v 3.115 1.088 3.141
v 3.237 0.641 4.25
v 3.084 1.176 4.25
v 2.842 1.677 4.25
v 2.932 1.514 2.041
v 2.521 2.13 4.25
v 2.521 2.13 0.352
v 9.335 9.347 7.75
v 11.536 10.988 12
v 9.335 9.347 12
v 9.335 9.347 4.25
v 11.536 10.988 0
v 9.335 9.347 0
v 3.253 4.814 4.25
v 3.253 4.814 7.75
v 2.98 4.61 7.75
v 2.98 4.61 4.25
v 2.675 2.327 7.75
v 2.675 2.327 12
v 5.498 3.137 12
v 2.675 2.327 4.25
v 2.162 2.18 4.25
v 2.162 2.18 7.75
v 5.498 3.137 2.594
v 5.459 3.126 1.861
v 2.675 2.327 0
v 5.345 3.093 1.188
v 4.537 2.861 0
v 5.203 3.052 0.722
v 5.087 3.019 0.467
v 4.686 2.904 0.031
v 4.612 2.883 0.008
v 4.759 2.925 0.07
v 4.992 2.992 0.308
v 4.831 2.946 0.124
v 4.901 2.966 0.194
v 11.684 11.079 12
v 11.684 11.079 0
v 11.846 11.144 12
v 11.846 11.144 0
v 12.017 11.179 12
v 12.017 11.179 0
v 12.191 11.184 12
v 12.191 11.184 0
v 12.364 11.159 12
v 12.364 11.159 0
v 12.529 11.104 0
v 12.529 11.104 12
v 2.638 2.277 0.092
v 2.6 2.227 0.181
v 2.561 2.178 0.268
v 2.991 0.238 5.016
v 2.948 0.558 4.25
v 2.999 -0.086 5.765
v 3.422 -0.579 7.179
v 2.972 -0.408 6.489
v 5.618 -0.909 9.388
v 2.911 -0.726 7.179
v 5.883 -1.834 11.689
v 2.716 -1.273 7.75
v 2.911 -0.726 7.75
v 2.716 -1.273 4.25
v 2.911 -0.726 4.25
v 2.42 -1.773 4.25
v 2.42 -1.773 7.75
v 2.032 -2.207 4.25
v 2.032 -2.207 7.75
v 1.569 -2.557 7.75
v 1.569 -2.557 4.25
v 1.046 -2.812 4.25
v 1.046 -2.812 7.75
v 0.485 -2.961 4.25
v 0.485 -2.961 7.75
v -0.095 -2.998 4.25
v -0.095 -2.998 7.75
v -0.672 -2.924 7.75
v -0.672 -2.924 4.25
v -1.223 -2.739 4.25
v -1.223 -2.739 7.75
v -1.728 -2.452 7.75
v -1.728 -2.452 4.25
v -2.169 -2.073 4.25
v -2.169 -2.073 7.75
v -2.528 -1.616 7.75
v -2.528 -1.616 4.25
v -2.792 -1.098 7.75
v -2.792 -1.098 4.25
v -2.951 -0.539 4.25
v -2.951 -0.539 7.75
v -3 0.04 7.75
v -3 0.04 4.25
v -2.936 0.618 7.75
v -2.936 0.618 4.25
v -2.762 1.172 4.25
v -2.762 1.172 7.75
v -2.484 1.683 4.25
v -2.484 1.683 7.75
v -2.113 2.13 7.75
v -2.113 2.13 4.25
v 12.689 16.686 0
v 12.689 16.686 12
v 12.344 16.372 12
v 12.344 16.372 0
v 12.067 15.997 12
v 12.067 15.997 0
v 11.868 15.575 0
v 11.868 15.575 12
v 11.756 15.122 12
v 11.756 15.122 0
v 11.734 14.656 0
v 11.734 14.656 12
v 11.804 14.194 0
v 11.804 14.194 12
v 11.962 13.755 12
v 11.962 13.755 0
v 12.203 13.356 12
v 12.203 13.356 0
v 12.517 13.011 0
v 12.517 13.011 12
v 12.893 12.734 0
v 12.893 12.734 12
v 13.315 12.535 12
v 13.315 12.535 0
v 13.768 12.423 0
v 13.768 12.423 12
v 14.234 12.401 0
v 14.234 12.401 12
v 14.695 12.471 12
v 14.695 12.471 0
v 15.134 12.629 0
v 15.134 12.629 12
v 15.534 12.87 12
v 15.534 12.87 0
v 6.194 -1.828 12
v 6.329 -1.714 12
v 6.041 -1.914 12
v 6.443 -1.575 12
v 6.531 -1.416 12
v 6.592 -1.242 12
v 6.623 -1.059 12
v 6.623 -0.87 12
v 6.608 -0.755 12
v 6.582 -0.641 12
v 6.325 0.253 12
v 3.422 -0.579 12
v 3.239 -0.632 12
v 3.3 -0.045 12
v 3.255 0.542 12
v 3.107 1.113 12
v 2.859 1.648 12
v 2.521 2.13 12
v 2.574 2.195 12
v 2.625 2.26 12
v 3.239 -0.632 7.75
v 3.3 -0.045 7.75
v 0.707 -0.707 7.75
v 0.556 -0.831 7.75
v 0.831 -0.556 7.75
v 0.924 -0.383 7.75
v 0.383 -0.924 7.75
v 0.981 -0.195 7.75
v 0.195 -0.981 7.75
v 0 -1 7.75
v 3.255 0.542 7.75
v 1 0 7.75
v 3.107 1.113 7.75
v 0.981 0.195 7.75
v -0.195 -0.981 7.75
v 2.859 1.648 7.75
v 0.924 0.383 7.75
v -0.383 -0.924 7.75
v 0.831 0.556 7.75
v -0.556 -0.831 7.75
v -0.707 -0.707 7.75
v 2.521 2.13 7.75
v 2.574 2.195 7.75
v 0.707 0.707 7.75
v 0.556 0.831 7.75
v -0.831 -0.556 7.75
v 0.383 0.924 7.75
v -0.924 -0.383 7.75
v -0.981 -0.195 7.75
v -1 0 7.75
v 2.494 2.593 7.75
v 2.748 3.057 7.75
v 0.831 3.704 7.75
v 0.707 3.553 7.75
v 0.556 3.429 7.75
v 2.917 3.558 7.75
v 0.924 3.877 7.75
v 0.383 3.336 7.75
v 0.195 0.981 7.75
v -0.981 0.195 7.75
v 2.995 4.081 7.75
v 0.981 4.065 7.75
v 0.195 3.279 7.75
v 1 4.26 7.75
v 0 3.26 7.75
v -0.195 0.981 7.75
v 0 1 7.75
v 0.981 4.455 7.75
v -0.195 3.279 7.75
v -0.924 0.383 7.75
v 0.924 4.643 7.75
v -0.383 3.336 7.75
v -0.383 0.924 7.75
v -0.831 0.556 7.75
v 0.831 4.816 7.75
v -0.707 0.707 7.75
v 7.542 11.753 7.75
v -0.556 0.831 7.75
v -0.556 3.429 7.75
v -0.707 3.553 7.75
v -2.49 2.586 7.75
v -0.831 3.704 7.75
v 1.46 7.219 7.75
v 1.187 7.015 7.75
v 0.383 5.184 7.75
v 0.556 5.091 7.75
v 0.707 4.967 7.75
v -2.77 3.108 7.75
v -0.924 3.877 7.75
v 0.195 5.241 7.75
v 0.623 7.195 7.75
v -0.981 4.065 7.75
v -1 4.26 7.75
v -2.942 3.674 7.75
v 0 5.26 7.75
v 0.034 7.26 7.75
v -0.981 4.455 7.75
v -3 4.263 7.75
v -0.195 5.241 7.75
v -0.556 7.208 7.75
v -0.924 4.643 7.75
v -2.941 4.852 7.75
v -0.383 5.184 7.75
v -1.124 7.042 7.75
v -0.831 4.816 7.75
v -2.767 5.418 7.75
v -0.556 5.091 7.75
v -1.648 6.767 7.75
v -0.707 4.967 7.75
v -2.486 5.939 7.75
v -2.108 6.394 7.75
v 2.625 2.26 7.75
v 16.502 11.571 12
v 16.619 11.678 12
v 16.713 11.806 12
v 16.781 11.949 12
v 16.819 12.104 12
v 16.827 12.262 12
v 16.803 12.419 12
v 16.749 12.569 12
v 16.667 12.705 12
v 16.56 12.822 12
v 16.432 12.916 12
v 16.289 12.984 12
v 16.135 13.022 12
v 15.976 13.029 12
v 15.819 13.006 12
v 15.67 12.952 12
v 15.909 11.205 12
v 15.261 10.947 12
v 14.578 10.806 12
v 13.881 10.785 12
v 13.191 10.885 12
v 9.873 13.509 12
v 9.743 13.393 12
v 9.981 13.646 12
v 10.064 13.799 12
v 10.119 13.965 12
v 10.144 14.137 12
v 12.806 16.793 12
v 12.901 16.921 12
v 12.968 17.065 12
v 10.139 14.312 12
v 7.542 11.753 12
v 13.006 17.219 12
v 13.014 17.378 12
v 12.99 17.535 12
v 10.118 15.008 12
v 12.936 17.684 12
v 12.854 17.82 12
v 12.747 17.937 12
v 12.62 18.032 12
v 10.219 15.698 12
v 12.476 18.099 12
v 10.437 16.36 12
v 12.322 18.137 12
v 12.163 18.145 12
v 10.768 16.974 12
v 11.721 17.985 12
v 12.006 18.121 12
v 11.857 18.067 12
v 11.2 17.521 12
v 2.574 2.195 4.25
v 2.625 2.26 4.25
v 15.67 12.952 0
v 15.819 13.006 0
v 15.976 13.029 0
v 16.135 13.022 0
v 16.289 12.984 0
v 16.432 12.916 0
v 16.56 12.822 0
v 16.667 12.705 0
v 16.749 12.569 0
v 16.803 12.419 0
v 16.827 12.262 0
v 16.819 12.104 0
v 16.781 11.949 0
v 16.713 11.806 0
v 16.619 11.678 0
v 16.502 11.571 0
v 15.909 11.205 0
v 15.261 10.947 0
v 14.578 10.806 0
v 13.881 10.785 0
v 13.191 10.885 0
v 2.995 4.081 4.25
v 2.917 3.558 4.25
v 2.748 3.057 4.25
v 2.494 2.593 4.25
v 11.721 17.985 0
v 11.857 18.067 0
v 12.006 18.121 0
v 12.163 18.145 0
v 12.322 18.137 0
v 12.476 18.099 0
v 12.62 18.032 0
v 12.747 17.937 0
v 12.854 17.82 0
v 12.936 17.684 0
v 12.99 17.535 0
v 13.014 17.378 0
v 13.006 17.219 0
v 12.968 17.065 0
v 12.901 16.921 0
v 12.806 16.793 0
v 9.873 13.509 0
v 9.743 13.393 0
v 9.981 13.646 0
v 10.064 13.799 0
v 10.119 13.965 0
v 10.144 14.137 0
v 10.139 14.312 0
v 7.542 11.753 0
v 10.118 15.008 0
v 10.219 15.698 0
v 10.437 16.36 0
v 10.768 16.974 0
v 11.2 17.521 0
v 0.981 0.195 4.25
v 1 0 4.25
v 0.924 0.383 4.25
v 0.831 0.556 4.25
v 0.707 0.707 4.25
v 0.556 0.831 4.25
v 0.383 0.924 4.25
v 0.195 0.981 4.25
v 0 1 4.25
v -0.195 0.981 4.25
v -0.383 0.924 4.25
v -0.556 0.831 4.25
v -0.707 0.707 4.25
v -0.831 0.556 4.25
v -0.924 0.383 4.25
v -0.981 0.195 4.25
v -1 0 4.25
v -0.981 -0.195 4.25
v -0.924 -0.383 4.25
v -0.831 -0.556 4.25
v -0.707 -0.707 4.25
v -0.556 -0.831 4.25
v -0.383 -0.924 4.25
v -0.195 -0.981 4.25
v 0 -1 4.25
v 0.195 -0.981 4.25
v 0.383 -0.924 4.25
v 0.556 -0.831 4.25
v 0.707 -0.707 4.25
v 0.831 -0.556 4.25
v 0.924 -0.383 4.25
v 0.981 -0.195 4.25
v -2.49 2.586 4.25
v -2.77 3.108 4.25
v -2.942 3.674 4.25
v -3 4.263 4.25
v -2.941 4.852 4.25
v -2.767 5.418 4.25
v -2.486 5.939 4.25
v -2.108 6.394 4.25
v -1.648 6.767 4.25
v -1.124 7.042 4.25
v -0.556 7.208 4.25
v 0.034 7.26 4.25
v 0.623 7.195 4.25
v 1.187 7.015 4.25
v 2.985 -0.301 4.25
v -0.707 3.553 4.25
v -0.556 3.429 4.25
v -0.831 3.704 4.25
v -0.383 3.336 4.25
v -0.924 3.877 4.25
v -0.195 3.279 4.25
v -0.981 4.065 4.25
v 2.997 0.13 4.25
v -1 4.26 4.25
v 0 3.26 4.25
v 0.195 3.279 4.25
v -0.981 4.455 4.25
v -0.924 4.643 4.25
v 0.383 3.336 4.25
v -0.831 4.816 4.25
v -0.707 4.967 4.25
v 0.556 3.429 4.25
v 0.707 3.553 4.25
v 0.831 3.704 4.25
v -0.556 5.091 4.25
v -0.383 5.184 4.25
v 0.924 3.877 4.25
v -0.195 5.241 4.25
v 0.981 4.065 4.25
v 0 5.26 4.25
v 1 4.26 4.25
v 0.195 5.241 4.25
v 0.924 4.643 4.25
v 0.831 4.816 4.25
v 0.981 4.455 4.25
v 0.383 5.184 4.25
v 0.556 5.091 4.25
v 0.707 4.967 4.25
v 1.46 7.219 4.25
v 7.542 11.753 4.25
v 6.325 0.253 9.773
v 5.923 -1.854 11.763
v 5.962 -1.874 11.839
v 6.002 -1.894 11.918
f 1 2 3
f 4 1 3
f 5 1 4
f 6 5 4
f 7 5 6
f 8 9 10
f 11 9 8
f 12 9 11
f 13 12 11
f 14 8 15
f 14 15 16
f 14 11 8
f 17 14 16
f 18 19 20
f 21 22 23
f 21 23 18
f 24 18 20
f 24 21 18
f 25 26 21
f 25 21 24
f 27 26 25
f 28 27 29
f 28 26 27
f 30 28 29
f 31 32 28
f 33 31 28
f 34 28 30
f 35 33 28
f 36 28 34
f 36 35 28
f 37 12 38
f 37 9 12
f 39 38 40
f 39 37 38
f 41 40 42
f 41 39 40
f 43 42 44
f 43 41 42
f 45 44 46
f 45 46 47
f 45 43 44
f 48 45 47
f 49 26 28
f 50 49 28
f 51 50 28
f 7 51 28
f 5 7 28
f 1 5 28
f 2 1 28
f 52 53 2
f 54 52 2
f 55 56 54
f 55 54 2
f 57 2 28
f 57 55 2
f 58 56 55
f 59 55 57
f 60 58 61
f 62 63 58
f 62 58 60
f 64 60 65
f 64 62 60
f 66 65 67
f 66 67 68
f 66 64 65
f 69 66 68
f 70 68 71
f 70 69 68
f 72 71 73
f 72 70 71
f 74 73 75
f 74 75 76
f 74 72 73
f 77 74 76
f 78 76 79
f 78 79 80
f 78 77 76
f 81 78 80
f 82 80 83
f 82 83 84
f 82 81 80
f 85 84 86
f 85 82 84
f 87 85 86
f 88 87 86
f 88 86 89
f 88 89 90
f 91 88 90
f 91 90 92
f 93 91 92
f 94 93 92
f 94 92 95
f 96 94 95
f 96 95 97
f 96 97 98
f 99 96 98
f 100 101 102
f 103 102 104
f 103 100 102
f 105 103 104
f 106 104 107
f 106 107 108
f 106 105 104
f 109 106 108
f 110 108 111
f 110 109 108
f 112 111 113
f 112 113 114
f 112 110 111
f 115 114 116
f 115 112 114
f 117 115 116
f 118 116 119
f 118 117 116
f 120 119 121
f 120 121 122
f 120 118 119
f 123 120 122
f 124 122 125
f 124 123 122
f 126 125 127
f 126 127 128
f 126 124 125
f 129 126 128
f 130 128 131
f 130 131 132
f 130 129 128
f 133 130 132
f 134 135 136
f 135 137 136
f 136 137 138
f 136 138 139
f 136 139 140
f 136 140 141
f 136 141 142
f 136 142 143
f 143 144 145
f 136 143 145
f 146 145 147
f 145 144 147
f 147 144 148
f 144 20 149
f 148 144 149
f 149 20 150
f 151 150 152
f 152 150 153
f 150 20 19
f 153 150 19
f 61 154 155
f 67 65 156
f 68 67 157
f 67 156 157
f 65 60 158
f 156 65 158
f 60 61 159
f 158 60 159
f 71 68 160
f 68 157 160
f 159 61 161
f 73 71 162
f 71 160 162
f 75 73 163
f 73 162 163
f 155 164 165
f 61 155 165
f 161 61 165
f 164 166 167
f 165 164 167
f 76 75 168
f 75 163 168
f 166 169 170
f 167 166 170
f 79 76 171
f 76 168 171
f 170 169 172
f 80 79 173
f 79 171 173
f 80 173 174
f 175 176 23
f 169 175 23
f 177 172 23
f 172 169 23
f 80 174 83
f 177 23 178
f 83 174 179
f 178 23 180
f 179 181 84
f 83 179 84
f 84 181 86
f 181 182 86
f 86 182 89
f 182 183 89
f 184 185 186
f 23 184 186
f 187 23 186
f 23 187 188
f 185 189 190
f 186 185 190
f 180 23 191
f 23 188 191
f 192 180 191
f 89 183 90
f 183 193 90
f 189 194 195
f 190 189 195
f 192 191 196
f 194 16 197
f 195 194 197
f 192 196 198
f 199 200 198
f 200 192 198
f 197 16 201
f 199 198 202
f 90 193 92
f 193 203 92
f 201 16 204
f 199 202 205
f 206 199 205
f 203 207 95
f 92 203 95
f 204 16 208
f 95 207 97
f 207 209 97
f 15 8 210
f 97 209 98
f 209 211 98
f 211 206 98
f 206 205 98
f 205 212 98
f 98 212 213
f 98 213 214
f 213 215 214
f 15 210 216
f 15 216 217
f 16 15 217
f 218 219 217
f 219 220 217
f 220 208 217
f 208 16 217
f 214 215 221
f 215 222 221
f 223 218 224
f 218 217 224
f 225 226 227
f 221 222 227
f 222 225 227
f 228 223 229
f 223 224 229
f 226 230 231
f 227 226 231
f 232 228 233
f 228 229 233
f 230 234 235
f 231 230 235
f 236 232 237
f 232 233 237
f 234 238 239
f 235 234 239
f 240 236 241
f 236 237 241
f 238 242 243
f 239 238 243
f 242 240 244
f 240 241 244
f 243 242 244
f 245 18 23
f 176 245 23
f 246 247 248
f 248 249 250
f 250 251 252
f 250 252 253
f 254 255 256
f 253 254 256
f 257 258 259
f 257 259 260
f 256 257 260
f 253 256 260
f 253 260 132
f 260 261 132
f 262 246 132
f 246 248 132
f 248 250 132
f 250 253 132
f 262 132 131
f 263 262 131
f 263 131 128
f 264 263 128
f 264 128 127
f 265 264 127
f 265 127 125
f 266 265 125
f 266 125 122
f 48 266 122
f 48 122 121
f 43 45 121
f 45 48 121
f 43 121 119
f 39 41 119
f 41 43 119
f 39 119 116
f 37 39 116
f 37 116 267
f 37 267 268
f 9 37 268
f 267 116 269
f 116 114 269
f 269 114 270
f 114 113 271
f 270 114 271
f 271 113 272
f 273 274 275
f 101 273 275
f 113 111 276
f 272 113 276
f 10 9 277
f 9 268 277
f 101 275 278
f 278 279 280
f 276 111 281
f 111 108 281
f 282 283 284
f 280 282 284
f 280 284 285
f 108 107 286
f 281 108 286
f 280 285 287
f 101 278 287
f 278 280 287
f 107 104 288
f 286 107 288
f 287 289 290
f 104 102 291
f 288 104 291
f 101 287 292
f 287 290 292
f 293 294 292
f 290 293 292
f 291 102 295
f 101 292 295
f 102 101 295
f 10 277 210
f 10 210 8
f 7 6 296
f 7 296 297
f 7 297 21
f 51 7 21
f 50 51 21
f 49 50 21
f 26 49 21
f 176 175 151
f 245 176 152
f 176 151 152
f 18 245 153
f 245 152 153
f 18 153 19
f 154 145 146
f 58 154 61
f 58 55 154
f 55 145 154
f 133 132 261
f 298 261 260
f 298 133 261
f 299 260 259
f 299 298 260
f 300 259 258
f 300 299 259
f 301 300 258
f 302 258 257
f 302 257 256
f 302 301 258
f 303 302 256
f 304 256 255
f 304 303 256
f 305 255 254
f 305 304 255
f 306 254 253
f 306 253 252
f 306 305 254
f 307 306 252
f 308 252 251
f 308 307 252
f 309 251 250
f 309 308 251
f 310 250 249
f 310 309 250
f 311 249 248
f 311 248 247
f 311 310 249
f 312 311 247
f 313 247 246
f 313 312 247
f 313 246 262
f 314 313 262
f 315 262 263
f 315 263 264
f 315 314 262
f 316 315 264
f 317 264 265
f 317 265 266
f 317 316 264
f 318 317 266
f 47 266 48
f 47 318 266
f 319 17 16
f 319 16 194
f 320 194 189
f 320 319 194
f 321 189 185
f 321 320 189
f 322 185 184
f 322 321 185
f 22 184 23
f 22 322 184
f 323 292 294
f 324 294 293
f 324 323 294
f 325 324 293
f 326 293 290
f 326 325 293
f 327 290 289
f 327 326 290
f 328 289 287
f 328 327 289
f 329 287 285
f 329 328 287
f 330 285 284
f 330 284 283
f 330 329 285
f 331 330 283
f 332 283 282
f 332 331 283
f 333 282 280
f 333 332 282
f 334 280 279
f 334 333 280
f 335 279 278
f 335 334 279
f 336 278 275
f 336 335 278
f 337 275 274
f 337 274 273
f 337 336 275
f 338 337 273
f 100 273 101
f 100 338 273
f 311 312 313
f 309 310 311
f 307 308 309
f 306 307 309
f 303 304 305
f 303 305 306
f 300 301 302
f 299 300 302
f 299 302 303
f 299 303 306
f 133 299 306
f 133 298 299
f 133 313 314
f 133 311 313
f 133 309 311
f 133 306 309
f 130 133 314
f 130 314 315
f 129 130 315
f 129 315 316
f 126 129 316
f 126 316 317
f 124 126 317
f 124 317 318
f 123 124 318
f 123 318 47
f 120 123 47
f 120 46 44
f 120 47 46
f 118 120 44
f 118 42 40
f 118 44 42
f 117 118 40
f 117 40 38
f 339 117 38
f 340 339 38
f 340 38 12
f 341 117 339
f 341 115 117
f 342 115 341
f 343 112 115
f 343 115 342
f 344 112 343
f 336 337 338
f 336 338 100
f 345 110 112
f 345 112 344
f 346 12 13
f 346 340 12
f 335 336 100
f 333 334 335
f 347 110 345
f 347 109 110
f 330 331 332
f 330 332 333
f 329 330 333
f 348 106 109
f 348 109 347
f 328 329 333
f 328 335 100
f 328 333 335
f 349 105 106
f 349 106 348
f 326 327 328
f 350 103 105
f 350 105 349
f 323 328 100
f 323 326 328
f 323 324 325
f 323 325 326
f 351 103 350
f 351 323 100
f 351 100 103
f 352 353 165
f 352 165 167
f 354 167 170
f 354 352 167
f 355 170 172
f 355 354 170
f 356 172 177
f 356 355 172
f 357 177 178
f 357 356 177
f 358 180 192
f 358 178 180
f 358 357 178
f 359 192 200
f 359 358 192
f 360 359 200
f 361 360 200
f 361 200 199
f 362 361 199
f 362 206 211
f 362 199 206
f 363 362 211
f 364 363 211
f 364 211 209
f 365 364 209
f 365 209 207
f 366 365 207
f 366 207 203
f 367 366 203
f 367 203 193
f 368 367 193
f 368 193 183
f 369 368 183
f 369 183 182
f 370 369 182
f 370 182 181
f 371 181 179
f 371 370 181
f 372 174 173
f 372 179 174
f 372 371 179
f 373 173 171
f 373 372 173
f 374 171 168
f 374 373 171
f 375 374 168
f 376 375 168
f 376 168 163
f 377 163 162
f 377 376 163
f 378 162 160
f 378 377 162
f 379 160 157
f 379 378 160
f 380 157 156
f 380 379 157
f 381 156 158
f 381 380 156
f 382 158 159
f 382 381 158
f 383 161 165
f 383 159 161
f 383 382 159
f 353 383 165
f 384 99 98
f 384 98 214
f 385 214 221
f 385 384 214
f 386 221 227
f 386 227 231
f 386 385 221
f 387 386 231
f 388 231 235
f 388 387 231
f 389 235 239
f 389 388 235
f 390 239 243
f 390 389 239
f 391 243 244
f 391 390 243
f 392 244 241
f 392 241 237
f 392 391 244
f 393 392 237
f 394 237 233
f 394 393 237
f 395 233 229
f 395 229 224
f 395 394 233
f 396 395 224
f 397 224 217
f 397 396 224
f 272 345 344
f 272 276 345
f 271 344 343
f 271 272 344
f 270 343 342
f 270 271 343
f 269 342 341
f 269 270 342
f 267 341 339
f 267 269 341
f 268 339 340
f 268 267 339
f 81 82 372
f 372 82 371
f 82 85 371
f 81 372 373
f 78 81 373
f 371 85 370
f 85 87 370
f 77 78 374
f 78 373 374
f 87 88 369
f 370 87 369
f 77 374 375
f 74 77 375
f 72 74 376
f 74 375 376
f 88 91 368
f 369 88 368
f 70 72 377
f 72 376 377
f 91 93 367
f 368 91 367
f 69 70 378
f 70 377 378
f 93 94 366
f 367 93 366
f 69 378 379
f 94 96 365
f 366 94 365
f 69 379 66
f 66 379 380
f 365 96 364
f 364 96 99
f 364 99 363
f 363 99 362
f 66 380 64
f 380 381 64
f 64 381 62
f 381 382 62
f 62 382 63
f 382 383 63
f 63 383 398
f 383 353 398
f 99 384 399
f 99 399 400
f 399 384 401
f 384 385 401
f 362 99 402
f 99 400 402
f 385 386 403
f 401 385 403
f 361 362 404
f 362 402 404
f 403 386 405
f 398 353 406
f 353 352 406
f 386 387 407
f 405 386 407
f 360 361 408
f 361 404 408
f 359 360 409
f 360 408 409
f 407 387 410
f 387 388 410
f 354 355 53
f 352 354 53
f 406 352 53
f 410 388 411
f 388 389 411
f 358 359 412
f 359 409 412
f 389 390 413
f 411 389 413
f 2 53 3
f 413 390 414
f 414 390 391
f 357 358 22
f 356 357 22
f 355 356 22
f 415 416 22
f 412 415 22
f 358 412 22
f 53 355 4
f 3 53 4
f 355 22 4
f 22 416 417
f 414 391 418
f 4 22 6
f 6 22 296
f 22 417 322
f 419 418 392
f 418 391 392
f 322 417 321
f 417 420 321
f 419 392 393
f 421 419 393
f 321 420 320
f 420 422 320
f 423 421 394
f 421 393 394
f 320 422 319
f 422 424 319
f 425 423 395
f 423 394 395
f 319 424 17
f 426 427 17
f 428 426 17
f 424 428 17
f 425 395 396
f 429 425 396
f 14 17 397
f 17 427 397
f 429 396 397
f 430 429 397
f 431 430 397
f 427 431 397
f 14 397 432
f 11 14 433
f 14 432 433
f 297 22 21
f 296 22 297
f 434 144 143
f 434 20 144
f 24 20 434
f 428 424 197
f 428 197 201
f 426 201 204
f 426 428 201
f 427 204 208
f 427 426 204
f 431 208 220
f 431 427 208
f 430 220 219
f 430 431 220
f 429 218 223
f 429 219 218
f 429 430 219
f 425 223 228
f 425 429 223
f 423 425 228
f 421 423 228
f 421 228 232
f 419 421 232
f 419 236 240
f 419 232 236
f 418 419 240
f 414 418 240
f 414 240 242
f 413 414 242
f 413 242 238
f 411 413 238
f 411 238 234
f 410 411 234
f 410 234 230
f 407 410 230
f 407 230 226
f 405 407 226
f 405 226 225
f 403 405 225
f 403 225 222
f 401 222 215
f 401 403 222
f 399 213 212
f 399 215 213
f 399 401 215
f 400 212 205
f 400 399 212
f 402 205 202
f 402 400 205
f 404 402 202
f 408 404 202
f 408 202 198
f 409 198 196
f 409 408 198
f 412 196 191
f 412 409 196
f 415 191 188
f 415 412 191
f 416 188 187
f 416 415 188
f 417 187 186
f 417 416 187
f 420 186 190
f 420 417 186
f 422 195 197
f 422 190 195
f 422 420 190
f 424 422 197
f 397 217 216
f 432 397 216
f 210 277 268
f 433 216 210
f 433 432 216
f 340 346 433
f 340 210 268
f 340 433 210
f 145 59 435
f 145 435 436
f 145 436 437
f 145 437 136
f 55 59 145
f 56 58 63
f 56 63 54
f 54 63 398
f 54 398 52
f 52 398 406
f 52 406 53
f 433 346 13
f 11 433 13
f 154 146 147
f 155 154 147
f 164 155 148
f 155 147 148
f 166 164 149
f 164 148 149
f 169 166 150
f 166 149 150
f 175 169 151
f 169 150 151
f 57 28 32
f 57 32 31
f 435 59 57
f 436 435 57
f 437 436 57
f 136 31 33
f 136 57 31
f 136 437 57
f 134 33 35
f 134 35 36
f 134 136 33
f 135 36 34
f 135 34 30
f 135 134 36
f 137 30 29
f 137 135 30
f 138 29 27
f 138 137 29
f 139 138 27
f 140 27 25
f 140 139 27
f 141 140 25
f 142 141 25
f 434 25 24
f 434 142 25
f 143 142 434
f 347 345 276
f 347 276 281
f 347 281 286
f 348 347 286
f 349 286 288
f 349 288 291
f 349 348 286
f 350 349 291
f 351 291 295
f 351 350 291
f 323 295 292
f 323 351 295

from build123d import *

# Parameters (mm, degrees)
SKETCH1_R            = 1
BOSS_EXTRUDE1_DEPTH  = 12
CUT_EXTRUDE1_DEPTH   = 4.25
CUT_EXTRUDE3_DEPTH   = 4.25
CUT_EXTRUDE2_START   = -3.551923789
CUT_EXTRUDE2_DEPTH   = 3.551923789
CUT_EXTRUDE2_START_2 = 4.25
CUT_EXTRUDE2_2_DEPTH = 3.5
FILLET8_R            = 1
FILLET9_R            = 1


with BuildPart() as part:
    # Sketch1 → Boss-Extrude1 (new body)
    with BuildSketch(Plane.XY):
        with BuildLine():
            Line((1.186636508, 7.015339144), (10.241749958, 13.764812698))
            ThreePointArc((10.241749958, 13.764812698), (10.336328118, 16.101061111), (11.720750751, 17.985305164))
            ThreePointArc((11.720750751, 17.985305164), (12.854265392, 17.819943261), (12.688903489, 16.68642862))
            ThreePointArc((12.688903489, 16.68642862), (12.203025305, 13.355854737), (15.533599188, 12.869976553))
            ThreePointArc((15.533599188, 12.869976553), (16.667113829, 12.704614651), (16.501751927, 11.57110001))
            ThreePointArc((16.501751927, 11.57110001), (14.300524873, 10.782683155), (12.034625399, 11.359485765))
            Line((12.034625399, 11.359485765), (2.979511949, 4.610012211))
            ThreePointArc((2.979511949, 4.610012211), (2.843457612, 3.303574986), (2.162315925, 2.180483268))
            Line((2.162315925, 2.180483268), (5.498303396, 3.137062282))
            Line((5.498303396, 3.137062282), (6.325215464, 0.253277194))
            Line((6.325215464, 0.253277194), (6.880438917, -1.683017096))
            Line((6.880438917, -1.683017096), (6.052988912, -1.920284566))
            Line((6.052988912, -1.920284566), (3.421928238, -0.579227021))
            Line((3.421928238, -0.579227021), (2.910887179, -0.725765687))
            ThreePointArc((2.910887179, -0.725765687), (-1.48262032, -2.608033164), (-2.112605027, 2.13))
            ThreePointArc((-2.112605027, 2.13), (-2.486159501, 5.938991047), (1.186636508, 7.015339144))
        make_face()
        with Locations((0, 4.26)):
            Circle(SKETCH1_R, mode=Mode.SUBTRACT)
        Circle(SKETCH1_R, mode=Mode.SUBTRACT)
    extrude(amount=BOSS_EXTRUDE1_DEPTH)

    # Sketch2 → Cut-Extrude1 (cut)
    with BuildSketch(Plane.XY.offset(12)):
        with BuildLine():
            ThreePointArc((2.520535657, 2.13), (0, 7.56), (-2.520535657, 2.13))
            ThreePointArc((-2.520535657, 2.13), (0, -3.3), (2.520535657, 2.13))
        make_face()
    cut_extrude1 = extrude(amount=-CUT_EXTRUDE1_DEPTH, mode=Mode.SUBTRACT)

    # Sketch4 → Cut-Extrude3 (cut)
    with BuildSketch(Plane.XY.offset(12)):
        Polygon((7.542328095, 11.752725651), (9.335203536, 9.347398719), (2.498013424, 4.251114272), (0.705137983, 6.656441205), align=None)
    cut_extrude3 = extrude(amount=-CUT_EXTRUDE3_DEPTH, mode=Mode.SUBTRACT)

    # Mirror1: Cut-Extrude1, Cut-Extrude3 across plane
    add(cut_extrude1.mirror(Plane.XY.offset(6)), mode=Mode.SUBTRACT)
    add(cut_extrude3.mirror(Plane.XY.offset(6)), mode=Mode.SUBTRACT)

    # Cut-Extrude2: read off the stored shape, not the designer's step
    # Cut-Extrude2 outline → Cut-Extrude2 (cut)
    with BuildSketch(Plane(origin=(5.91175943, 1.695169738, 0), x_dir=(0, 0, -1), z_dir=(0.9612616959383197, 0.27563735581699633, 0)).offset(CUT_EXTRUDE2_START)):
        Polygon((0, 1.5), (-12, -3.514325857), (0, -3.514325857), align=None)
    extrude(amount=CUT_EXTRUDE2_DEPTH, mode=Mode.SUBTRACT)

    # Cut-Extrude2 2 outline → Cut-Extrude2 2 (add)
    with BuildSketch(Plane.XY.offset(CUT_EXTRUDE2_START_2)):
        with BuildLine():
            ThreePointArc((2.910887178, -0.725765687), (2.998773461, -0.085777187), (2.947613523, 0.558188603))
            Line((2.947613523, 0.558188603), (2.674578173, 2))
            Line((2.674578173, 2), (2.129286445, 2))
            Line((2.129286445, 2), (2.573481441, 0.450907955))
            Line((2.573481441, 0.450907955), (2.910887178, -0.725765687))
        make_face()
    extrude(amount=CUT_EXTRUDE2_2_DEPTH)

    # Fillet8
    fillet8_edges = [part.edges().sort_by_distance(p)[0] for p in [
        (10.241749958, 13.764812698, 6),
        (12.034625399, 11.359485765, 6),
    ]]
    fillet(fillet8_edges, radius=FILLET8_R)

    # Fillet9
    fillet9_edges = [part.edges().sort_by_distance(p)[0] for p in [
        (6.189371157, 0.727022594, 6),
    ]]
    fillet(fillet9_edges, radius=FILLET9_R)


solid = part.part
